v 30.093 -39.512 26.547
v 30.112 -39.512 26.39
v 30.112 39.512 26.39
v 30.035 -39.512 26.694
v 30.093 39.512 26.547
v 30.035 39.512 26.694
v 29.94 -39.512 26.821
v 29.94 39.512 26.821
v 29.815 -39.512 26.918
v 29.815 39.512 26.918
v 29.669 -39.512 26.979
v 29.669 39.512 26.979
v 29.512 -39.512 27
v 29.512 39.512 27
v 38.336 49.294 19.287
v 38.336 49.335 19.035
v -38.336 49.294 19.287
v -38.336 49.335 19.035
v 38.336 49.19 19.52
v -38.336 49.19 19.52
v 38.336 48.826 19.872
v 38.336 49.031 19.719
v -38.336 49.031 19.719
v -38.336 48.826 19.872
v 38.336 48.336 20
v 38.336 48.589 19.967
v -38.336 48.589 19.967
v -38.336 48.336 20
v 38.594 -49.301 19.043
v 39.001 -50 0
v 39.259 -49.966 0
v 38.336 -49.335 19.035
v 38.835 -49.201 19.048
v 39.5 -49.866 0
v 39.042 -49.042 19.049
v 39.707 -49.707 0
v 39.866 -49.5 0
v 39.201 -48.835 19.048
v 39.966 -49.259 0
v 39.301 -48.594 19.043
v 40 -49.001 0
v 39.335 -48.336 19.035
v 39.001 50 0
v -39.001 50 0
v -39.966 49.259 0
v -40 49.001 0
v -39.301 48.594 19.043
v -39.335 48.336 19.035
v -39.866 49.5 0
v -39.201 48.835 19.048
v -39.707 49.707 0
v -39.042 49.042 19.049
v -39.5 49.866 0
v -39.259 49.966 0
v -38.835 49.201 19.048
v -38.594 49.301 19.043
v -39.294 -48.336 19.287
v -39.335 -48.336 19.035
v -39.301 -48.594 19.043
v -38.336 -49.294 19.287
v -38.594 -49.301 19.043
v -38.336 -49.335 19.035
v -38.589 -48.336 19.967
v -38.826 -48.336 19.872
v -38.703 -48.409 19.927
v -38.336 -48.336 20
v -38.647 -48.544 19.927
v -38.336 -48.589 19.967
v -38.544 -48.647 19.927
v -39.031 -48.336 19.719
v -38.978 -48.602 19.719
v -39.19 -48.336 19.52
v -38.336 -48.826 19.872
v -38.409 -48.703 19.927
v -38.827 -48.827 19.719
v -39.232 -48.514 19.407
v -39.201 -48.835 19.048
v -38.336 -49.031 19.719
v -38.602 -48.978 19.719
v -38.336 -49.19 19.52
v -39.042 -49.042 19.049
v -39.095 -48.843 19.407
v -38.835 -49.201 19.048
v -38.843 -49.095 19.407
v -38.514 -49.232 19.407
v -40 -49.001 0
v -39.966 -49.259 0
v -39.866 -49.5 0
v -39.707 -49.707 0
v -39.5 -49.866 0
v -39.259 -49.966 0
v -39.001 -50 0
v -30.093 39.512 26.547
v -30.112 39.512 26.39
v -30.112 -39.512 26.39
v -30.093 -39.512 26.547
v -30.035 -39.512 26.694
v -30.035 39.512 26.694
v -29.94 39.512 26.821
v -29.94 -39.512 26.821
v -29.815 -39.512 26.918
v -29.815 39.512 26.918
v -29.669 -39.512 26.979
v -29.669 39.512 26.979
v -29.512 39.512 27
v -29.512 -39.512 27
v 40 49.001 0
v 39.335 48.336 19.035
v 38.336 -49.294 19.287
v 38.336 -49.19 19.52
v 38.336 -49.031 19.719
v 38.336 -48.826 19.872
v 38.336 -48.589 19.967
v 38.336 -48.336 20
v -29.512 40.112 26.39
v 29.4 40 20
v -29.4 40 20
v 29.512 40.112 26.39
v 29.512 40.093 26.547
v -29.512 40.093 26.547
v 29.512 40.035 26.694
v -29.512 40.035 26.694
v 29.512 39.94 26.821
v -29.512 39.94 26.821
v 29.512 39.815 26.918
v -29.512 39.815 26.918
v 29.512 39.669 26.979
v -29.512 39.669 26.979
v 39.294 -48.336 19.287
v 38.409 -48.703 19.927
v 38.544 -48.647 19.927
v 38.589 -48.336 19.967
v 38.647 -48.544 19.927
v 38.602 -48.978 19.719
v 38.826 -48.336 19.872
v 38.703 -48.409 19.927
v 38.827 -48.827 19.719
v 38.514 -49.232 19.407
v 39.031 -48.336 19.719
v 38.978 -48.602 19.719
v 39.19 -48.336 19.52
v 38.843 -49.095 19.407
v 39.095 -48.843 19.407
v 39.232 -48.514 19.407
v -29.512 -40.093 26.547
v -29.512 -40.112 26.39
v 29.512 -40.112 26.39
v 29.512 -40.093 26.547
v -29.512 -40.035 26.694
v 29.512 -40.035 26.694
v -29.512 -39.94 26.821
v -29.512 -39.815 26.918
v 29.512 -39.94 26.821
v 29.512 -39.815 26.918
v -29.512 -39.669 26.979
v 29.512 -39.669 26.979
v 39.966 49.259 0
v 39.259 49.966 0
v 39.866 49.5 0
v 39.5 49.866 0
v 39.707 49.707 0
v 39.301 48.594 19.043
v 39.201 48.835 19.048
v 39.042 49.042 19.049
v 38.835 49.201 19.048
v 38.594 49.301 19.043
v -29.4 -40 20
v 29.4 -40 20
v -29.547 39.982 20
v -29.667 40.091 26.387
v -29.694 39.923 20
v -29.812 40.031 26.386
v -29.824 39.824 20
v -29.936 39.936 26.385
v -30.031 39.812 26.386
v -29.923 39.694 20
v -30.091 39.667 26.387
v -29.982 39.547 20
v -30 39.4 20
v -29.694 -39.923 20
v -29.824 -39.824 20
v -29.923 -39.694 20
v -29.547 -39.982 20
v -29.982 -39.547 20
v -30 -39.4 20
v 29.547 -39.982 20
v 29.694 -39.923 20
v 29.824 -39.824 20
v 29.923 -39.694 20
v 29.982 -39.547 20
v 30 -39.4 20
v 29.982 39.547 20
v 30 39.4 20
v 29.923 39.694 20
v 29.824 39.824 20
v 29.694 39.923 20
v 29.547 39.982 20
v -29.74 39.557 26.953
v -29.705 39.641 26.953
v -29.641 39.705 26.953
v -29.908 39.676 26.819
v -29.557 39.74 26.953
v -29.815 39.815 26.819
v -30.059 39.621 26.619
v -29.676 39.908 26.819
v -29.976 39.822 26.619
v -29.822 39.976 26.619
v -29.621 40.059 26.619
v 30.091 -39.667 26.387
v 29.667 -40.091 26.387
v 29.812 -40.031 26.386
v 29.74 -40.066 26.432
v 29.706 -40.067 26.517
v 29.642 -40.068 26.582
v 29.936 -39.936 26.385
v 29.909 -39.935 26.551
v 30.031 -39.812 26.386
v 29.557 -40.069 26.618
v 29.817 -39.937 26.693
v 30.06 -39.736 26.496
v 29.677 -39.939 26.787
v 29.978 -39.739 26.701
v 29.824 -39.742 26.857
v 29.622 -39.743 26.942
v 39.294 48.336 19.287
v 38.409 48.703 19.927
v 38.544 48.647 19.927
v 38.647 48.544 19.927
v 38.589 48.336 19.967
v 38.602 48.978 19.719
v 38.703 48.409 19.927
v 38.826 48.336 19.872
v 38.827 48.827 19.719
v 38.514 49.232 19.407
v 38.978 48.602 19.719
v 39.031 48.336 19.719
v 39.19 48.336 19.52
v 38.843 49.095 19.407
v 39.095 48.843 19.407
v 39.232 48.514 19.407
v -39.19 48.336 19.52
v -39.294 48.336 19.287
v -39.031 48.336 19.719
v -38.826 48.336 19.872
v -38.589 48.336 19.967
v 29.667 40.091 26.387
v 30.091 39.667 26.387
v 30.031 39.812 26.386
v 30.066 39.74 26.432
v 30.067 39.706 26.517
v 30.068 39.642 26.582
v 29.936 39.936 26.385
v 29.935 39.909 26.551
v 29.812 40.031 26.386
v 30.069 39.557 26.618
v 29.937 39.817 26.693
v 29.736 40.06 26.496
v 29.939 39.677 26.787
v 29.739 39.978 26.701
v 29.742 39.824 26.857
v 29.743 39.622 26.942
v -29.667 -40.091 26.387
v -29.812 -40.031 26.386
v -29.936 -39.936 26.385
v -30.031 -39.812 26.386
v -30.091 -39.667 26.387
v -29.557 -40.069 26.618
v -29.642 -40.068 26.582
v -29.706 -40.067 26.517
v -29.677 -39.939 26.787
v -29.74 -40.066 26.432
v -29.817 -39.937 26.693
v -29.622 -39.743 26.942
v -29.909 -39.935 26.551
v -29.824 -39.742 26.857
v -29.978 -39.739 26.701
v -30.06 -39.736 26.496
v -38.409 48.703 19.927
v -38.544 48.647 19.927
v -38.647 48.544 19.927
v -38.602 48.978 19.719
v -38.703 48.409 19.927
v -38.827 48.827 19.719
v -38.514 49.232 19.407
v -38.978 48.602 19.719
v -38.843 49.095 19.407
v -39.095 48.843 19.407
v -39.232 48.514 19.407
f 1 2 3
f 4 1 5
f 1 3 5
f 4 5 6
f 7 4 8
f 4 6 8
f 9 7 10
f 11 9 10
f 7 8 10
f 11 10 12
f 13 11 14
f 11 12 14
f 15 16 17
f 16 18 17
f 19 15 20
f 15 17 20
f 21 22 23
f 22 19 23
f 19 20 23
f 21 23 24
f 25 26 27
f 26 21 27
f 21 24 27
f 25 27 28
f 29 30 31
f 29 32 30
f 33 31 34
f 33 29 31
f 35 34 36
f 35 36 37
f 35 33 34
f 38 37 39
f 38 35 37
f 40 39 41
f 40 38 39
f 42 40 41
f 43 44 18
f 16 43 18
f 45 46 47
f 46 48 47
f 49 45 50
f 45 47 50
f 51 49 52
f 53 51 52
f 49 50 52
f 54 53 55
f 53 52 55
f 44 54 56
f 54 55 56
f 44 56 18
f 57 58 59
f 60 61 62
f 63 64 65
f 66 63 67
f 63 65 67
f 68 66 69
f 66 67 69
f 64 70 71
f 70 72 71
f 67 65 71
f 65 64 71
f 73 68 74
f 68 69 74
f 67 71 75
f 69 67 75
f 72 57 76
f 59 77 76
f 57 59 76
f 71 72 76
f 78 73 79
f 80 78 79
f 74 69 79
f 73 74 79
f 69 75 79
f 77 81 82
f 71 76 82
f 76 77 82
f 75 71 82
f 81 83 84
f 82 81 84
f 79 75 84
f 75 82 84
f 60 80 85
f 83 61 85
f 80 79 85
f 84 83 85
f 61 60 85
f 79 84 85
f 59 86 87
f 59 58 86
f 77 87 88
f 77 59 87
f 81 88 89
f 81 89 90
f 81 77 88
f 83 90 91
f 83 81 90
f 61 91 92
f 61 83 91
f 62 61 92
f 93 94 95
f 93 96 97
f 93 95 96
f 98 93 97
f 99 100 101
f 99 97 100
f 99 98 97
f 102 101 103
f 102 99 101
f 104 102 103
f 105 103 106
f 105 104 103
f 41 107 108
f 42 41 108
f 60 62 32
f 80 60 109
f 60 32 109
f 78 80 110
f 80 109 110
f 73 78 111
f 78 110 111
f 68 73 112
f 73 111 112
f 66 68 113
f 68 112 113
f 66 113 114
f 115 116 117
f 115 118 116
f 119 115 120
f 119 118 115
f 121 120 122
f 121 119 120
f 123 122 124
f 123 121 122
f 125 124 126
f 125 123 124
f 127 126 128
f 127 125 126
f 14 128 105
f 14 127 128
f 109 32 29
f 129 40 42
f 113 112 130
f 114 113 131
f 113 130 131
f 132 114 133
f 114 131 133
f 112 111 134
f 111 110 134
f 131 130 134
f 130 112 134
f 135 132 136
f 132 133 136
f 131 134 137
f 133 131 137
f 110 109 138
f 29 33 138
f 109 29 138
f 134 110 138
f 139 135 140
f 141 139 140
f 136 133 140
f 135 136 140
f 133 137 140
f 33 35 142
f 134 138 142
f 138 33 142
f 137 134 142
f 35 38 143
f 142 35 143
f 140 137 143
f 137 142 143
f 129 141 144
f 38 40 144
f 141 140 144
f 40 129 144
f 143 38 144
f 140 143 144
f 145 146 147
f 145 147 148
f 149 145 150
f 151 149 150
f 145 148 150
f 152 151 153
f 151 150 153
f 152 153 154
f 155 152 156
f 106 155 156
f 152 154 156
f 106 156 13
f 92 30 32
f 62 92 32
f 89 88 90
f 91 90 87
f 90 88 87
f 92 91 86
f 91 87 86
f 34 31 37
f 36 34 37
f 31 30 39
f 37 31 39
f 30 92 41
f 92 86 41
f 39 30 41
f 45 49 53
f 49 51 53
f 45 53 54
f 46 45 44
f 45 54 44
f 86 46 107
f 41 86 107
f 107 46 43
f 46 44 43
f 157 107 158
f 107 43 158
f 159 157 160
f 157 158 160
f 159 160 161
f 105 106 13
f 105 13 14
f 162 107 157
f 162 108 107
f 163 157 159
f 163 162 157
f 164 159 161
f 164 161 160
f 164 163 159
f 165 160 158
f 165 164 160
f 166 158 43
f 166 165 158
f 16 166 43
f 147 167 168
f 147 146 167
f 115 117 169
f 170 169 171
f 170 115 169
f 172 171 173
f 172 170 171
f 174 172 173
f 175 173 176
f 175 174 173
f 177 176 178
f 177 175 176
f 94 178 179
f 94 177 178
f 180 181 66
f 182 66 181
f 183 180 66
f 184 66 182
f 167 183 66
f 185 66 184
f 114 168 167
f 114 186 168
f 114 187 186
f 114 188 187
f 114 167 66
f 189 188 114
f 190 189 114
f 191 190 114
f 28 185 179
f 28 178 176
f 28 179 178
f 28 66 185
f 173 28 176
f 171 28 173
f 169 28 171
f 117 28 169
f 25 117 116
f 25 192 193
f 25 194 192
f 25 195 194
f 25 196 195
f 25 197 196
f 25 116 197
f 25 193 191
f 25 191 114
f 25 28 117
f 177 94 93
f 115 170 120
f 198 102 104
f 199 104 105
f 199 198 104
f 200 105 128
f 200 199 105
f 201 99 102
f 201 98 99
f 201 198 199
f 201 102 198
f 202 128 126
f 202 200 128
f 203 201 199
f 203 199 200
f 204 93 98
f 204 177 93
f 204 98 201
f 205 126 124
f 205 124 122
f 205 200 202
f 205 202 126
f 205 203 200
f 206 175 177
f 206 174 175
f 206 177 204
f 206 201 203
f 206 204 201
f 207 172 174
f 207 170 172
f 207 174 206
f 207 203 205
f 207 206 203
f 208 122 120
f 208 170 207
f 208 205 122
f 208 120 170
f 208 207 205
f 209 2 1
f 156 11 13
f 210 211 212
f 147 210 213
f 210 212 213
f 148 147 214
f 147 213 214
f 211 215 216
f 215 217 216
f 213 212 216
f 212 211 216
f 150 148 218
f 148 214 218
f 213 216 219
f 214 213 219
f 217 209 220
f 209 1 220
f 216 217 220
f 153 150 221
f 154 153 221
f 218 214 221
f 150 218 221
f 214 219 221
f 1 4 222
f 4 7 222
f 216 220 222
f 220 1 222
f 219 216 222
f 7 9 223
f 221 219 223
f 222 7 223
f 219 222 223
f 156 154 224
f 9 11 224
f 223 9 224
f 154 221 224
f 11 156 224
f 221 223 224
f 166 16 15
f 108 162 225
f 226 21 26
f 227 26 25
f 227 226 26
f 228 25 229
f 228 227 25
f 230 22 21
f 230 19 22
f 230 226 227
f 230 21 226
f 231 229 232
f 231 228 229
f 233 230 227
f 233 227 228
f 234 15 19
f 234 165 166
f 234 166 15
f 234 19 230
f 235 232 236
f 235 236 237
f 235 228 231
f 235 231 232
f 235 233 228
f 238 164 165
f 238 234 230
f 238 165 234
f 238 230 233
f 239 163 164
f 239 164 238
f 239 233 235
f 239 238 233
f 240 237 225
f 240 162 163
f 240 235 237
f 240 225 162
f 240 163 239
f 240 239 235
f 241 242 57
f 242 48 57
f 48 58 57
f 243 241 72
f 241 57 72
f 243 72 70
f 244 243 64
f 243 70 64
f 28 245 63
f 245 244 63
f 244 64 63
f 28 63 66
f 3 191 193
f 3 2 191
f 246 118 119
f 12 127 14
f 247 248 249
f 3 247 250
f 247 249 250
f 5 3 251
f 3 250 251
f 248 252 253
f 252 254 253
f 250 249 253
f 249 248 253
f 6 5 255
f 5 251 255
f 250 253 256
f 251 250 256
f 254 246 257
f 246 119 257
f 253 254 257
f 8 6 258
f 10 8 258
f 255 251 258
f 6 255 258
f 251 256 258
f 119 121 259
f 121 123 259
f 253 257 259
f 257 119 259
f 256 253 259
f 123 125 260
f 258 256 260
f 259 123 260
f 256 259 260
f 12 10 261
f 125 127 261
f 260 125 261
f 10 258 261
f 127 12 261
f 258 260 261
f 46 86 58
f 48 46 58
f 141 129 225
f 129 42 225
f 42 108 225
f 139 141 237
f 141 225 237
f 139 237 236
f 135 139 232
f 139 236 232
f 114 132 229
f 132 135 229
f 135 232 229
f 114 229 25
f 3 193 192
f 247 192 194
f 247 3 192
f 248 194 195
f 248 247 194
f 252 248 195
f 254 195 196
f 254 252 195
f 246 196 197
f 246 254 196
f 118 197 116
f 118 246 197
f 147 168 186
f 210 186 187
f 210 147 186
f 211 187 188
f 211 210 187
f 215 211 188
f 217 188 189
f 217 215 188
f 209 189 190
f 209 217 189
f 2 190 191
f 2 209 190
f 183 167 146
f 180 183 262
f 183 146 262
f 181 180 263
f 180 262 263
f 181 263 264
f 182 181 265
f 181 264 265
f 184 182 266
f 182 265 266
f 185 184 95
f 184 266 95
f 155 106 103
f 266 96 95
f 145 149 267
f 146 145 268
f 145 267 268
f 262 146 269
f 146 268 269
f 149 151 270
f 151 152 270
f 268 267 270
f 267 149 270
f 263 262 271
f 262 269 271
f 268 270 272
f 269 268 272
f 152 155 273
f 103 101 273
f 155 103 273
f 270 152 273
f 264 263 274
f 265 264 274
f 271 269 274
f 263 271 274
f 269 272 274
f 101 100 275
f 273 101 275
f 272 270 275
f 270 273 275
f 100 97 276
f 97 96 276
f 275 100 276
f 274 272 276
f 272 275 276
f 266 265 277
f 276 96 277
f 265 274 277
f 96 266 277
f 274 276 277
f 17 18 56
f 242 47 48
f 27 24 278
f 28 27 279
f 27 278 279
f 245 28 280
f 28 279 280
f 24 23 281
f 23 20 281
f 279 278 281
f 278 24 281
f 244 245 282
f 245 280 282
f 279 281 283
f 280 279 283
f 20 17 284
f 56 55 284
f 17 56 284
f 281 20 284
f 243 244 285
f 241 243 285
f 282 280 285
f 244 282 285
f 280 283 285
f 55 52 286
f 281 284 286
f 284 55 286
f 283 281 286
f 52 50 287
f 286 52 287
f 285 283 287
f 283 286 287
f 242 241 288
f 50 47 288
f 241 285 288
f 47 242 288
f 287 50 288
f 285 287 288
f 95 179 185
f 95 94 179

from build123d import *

# Parameters (mm, degrees)
F0_W     = 80
F0_H     = 100
F1_DEPTH = 20
F1_TAPER = 2
F2_W     = 60
F2_H     = 80
F3_DEPTH = 7
F3_TAPER = -1
F4_R     = 1
F5_R     = 0.6


with BuildPart() as f1:
    # F0 (on Top) → F1 (new body)
    with BuildSketch(Plane.XY):
        Rectangle(F0_W, F0_H)
    extrude(amount=F1_DEPTH, taper=F1_TAPER)

    # F2 (on face) → F3 (join)
    with BuildSketch(Plane.XY.offset(20)):
        Rectangle(F2_W, F2_H)
    extrude(amount=F3_DEPTH, taper=F3_TAPER)

    # F4
    f4_edges = [f1.edges().sort_by_distance(p)[0] for p in [
        (-39.650792, 49.650792, 10),
        (39.650792, 49.650792, 10),
        (39.650792, -49.650792, 10),
        (-39.650792, -49.650792, 10),
        (0, 49.301585, 20),
        (-39.301585, 0, 20),
        (0, -49.301585, 20),
        (39.301585, 0, 20),
    ]]
    fillet(f4_edges, radius=F4_R)

    # F5
    f5_edges = [f1.edges().sort_by_distance(p)[0] for p in [
        (-30.061093, 40.061093, 23.5),
        (-30.122185, 0, 27),
        (0, 40.122185, 27),
        (30.061093, 40.061093, 23.5),
        (30.122185, 0, 27),
        (30.061093, -40.061093, 23.5),
        (0, -40.122185, 27),
        (-30.061093, -40.061093, 23.5),
    ]]
    fillet(f5_edges, radius=F5_R)


solid = f1.part
